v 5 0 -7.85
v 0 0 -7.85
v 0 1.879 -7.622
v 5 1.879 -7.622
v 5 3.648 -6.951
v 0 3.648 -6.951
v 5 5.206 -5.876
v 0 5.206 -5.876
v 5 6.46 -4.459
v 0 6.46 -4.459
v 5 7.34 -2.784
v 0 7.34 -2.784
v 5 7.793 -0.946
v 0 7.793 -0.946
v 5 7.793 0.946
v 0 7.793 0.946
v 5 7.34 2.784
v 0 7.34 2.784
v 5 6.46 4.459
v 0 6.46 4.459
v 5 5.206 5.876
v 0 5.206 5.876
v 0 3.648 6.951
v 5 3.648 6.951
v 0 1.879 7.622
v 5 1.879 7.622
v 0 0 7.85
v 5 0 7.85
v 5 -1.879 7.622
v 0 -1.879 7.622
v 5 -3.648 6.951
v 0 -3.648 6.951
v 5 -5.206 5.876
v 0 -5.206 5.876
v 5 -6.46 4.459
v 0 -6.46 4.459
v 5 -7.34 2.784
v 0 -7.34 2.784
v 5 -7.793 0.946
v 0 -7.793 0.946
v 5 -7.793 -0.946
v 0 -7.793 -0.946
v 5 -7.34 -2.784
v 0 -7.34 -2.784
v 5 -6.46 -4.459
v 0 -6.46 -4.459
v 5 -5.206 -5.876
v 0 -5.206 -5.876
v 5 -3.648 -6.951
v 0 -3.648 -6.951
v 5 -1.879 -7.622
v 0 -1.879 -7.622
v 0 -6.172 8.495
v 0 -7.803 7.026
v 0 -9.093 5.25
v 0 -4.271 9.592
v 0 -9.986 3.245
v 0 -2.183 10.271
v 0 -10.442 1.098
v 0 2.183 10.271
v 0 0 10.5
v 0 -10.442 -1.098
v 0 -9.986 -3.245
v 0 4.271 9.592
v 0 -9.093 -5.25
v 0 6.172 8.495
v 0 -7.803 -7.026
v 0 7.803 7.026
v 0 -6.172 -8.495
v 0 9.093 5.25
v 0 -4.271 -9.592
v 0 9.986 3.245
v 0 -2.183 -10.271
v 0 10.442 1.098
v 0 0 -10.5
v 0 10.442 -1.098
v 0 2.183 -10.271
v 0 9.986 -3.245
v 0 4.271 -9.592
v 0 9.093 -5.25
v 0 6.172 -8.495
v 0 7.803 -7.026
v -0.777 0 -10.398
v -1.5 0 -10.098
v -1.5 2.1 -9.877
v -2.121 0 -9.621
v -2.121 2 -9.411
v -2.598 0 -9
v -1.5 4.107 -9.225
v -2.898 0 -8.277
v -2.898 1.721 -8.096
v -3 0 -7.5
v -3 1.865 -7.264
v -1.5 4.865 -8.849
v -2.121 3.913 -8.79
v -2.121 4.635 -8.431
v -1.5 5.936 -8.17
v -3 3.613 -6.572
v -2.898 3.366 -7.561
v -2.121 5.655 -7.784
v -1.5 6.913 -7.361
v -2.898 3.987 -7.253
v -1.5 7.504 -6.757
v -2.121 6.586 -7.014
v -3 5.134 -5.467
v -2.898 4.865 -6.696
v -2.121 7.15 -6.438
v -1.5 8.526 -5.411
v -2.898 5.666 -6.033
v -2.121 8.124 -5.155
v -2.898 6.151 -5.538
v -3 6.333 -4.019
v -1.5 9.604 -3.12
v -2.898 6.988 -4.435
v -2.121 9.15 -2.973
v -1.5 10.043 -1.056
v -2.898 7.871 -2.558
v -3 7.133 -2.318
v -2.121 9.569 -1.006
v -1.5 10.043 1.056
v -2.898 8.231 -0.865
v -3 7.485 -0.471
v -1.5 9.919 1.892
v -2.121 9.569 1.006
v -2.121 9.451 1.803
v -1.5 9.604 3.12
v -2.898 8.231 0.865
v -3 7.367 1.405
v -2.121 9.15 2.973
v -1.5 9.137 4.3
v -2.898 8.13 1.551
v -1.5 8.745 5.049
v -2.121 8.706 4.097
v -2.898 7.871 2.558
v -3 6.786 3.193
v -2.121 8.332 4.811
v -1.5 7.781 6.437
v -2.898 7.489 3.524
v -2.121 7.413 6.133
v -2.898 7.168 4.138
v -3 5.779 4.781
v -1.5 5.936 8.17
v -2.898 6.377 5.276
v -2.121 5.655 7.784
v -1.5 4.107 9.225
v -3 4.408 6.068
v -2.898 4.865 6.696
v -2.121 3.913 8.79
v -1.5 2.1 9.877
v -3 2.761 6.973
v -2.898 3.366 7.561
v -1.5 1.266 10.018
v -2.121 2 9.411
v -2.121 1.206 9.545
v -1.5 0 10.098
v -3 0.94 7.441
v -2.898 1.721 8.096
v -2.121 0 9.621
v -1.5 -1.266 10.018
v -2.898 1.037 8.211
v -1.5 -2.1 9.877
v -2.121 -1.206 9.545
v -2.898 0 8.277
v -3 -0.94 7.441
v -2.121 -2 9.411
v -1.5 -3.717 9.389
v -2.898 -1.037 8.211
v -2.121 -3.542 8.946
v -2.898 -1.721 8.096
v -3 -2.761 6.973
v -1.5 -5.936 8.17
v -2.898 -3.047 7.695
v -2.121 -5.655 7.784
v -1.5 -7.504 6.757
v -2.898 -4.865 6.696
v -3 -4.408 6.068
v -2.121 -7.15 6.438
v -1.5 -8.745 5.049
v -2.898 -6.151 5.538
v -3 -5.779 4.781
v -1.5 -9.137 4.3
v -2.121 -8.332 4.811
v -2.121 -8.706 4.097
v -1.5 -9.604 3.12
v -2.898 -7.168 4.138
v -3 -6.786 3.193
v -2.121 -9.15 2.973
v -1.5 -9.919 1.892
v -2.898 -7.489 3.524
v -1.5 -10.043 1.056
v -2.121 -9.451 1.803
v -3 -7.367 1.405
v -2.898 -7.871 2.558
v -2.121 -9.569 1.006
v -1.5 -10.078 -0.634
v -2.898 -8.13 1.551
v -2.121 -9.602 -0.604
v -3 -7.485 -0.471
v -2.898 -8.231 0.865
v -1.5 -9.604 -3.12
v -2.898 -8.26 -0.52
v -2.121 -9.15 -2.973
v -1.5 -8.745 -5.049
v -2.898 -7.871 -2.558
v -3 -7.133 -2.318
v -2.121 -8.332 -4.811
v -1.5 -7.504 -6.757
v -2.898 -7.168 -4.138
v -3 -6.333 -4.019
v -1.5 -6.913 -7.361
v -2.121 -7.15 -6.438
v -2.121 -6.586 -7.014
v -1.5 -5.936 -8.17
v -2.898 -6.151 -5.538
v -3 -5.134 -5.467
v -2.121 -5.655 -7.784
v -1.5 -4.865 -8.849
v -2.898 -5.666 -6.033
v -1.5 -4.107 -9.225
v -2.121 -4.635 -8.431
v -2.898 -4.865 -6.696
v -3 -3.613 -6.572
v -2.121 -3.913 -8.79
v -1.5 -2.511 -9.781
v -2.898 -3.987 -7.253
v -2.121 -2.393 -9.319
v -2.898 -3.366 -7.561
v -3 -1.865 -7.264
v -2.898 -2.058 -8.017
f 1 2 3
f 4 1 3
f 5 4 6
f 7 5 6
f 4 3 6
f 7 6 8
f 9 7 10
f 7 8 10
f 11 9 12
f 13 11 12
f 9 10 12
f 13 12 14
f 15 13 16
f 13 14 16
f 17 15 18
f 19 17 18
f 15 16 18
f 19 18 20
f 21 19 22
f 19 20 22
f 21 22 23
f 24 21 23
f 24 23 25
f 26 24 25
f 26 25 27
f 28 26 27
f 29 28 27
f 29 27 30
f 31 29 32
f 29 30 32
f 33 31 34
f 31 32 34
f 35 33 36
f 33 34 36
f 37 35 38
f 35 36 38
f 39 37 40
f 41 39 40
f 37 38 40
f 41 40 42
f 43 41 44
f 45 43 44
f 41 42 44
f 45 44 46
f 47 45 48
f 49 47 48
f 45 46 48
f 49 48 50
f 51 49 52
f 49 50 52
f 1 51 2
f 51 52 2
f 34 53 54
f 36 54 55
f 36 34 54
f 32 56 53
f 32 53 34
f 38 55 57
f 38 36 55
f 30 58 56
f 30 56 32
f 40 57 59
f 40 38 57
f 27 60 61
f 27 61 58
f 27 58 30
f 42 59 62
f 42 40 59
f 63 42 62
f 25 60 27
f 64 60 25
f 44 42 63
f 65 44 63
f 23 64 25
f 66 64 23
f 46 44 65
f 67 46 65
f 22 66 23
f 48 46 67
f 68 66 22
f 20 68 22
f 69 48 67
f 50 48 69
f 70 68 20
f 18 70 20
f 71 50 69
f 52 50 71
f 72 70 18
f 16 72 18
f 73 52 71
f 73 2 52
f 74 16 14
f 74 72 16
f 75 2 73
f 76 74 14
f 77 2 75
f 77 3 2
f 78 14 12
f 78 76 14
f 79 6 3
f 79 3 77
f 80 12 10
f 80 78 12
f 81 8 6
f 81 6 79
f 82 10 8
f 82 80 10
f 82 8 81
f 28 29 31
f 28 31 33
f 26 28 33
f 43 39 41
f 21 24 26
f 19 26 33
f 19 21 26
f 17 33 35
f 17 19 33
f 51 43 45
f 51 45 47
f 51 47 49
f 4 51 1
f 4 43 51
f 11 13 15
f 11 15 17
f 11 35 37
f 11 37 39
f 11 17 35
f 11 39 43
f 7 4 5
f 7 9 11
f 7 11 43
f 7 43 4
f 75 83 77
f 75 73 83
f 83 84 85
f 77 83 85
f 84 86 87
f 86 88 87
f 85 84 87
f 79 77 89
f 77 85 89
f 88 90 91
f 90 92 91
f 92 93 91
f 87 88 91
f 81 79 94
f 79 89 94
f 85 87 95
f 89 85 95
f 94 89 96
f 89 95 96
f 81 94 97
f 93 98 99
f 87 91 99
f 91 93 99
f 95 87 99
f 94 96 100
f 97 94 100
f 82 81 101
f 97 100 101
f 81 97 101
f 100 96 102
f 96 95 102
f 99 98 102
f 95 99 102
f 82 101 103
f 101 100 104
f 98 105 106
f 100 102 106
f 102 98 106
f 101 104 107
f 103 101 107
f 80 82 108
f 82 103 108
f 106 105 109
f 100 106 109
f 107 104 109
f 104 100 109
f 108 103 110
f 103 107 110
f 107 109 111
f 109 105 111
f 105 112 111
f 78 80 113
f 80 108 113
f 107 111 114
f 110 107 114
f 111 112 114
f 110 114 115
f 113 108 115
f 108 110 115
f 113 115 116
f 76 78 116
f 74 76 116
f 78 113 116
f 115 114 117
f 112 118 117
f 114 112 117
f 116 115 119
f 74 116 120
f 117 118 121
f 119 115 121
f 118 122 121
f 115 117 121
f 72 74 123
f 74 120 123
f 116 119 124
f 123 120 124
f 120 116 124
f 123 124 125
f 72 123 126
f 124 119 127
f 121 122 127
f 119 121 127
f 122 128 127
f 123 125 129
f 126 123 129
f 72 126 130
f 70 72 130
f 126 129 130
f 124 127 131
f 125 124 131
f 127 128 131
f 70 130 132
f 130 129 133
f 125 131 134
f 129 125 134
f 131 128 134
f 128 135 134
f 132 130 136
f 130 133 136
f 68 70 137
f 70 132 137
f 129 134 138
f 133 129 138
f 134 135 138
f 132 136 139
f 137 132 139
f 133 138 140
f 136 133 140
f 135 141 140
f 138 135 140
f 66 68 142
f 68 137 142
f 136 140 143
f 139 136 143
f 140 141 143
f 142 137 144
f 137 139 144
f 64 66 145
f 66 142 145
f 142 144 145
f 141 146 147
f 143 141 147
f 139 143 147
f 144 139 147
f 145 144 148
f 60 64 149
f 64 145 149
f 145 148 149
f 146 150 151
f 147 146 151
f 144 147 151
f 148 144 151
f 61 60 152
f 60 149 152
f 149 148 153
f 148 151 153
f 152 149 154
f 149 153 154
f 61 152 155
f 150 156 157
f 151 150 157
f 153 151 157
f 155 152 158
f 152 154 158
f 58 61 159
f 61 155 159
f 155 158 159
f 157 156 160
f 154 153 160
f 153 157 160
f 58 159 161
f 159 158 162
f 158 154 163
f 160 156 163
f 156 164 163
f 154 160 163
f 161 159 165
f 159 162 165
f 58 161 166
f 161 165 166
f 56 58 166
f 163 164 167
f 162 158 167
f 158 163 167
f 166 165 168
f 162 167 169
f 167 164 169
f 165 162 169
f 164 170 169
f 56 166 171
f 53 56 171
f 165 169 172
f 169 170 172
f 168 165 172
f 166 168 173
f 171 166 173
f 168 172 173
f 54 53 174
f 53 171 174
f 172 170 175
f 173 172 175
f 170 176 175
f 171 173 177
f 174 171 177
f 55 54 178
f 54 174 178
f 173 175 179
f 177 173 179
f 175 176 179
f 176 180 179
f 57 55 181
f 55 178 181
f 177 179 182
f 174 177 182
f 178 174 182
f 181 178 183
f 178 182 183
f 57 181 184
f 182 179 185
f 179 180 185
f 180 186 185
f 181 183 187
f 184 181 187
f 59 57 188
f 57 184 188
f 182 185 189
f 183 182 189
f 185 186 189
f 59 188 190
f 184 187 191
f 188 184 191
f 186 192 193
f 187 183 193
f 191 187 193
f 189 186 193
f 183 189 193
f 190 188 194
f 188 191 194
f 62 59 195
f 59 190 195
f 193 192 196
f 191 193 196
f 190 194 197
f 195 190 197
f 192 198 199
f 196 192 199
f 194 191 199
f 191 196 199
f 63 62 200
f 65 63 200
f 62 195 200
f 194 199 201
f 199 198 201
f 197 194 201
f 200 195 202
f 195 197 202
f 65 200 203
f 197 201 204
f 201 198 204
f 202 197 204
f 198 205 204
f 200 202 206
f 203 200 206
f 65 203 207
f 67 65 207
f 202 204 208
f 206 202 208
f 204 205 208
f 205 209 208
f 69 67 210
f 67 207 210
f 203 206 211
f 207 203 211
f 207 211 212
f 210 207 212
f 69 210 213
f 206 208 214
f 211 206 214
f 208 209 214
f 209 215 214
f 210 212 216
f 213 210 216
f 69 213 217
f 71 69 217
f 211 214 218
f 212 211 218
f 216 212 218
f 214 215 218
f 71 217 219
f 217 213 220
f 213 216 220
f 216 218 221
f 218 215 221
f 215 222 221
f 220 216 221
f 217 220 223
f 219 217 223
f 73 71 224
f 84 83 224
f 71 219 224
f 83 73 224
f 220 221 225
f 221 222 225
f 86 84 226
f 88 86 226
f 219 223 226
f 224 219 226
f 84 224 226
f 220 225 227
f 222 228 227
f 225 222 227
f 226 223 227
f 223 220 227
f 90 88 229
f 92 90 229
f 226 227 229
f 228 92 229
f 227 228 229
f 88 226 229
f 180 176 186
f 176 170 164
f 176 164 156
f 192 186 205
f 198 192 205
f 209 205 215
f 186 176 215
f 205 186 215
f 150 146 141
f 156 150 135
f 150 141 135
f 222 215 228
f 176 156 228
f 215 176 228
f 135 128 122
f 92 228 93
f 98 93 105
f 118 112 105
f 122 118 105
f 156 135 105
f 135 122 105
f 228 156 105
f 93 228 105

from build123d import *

# Parameters (mm, degrees)
SKETCH1_R           = 7.85
BOSS_EXTRUDE1_DEPTH = 5
SKETCH1_3_R         = 10.5
BOSS_EXTRUDE2_DEPTH = 3
FILLET1_R           = 3


with BuildPart() as part:
    # Sketch1 → Boss-Extrude1 (new body)
    with BuildSketch(Plane(origin=(0, 0, 0), x_dir=(0, 0, -1), z_dir=(1, 0, 0))):
        Circle(SKETCH1_R)
    extrude(amount=BOSS_EXTRUDE1_DEPTH)

    # Sketch1<3> → Boss-Extrude2 (add)
    with BuildSketch(Plane(origin=(0, 0, 0), x_dir=(0, 0, -1), z_dir=(1, 0, 0))):
        Circle(SKETCH1_3_R)
    extrude(amount=-BOSS_EXTRUDE2_DEPTH)

    # Fillet1
    fillet1_edges = [part.edges().sort_by_distance(p)[0] for p in [
        (-3, 0, 10.5),
    ]]
    fillet(fillet1_edges, radius=FILLET1_R - 0.0001)  # a hair under: the kernel refuses the full size


solid = part.part
